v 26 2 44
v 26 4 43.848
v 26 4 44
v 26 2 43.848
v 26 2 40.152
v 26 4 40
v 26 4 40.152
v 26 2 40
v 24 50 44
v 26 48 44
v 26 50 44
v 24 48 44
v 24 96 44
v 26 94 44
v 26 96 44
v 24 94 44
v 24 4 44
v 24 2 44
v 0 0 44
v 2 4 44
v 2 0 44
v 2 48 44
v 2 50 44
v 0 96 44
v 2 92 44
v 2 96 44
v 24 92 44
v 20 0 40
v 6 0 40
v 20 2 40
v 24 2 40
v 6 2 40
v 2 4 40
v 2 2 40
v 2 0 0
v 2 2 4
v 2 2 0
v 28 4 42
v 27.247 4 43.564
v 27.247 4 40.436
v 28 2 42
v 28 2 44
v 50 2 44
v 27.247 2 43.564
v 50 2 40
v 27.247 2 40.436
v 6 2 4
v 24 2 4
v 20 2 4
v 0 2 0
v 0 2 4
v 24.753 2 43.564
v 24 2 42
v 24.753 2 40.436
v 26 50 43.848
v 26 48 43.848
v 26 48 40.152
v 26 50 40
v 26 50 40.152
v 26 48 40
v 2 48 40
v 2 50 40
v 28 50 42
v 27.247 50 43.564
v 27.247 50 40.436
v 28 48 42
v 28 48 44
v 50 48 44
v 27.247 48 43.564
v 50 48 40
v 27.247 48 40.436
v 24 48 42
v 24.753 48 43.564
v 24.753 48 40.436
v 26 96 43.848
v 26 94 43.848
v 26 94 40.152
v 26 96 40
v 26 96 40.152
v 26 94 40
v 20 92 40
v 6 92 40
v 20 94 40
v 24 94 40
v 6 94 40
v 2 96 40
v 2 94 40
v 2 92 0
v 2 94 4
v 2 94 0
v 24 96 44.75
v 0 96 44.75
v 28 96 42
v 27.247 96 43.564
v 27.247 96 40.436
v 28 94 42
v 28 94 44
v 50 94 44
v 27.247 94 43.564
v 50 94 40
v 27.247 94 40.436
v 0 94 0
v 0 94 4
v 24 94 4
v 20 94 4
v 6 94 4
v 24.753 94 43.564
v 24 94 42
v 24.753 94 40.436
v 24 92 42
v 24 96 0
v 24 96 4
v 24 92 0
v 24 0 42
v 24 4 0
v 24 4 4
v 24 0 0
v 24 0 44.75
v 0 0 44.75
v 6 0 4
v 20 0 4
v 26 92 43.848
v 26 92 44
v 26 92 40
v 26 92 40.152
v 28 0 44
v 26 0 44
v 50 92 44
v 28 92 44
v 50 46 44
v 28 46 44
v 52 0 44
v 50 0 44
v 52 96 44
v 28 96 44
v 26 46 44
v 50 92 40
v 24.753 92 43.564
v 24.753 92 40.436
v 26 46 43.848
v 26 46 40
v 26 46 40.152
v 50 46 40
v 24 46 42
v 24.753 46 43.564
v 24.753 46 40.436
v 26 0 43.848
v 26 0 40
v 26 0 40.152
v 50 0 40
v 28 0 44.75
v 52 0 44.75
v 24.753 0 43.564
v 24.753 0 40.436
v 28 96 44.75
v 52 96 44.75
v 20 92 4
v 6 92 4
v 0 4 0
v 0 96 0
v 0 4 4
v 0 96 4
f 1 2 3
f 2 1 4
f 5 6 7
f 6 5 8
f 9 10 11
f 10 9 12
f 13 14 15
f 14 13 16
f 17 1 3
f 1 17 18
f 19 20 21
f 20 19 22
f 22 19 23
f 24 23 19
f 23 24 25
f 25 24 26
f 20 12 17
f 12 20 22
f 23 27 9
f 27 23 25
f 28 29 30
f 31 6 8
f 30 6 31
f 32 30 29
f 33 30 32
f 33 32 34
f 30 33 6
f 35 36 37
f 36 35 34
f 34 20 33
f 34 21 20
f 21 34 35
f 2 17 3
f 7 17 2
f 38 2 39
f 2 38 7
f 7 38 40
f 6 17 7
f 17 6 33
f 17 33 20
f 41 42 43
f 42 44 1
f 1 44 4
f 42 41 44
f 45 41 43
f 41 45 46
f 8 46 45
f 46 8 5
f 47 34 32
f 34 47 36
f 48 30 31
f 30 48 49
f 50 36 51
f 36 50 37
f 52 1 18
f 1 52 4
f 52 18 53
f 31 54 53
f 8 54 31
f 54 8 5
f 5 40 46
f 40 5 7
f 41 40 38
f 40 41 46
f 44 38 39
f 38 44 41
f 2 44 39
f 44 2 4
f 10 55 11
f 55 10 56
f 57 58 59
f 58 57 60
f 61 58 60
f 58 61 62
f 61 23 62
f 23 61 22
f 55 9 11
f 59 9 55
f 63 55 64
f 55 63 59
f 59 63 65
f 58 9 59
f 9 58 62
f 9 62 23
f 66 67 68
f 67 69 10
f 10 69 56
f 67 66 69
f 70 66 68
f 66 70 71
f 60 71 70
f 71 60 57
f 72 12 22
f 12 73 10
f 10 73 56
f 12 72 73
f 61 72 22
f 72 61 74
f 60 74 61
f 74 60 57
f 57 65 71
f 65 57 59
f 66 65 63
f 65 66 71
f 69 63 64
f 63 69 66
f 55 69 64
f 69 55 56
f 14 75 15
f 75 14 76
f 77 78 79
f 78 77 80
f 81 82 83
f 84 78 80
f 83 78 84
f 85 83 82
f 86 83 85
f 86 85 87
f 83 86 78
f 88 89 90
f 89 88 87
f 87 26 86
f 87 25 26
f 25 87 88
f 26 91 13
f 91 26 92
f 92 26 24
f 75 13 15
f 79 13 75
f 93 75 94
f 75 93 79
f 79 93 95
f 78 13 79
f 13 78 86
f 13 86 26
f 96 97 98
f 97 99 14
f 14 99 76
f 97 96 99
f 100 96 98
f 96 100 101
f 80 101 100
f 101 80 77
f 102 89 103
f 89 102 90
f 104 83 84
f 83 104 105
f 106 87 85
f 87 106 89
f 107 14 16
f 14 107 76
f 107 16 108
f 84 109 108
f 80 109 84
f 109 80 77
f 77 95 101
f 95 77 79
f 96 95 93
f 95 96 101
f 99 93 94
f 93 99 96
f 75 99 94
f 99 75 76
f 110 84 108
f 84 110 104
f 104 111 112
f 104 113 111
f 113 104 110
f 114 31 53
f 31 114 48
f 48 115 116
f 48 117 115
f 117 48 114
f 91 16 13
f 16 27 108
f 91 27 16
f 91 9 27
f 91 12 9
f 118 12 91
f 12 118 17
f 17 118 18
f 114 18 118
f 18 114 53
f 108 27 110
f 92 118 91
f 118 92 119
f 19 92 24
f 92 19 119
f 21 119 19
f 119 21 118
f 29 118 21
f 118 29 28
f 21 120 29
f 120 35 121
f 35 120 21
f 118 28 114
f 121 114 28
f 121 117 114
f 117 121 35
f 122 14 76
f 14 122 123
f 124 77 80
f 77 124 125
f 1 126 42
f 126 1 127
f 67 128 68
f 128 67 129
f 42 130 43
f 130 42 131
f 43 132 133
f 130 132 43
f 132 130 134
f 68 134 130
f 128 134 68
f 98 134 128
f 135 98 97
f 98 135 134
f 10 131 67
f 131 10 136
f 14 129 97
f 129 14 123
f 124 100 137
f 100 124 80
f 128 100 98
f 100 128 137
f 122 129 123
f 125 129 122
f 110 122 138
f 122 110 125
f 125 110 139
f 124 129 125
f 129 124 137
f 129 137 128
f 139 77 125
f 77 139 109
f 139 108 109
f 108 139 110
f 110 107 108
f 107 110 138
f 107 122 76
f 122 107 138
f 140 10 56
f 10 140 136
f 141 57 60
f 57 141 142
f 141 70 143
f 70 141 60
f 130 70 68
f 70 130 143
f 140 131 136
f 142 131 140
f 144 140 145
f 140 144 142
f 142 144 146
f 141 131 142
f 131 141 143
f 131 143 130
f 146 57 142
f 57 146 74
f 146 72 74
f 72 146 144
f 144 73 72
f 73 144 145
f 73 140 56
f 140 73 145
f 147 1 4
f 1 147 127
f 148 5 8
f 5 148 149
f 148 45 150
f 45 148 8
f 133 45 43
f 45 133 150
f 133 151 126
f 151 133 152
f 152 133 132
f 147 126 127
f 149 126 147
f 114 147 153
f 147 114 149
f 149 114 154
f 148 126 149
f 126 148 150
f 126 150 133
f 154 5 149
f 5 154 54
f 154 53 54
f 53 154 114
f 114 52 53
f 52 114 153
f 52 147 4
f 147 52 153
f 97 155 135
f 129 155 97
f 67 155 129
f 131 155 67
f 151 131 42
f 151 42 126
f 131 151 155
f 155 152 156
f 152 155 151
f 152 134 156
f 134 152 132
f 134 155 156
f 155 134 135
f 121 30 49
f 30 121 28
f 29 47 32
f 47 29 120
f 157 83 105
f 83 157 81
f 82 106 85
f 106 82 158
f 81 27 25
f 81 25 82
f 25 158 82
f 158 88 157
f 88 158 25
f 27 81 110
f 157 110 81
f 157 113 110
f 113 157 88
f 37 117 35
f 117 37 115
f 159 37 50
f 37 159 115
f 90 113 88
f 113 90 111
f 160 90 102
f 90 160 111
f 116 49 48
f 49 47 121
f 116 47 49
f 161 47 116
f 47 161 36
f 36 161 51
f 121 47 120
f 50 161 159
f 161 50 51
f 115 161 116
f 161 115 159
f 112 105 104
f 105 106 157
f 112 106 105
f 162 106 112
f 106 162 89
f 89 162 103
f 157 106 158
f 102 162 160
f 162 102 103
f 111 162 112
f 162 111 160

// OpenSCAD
// file: casters.scad
function caster_axel(wheel_r, axel_r) = [1 + axel_r, wheel_r + axel_r, 0];

module caster_bracket(wheel_r, wheel_h, axel_r, plate_t, padding=0.125, $fn=$fn) {
    plate_side = wheel_r + axel_r + 1;
    
    module caster_plate(
        wheel_r,
        axel_r,
        plate_t,
    ) {
        difference() {
            linear_extrude(plate_t)
            polygon([
                [0, 0],
                [0, plate_side],
                [2 + axel_r * 2, plate_side],
                [plate_side, 2 + axel_r * 2],
                [plate_side, 0],
            ]);
            
            axel = caster_axel(wheel_r, axel_r);
            translate(axel)
            cylinder(r=axel_r, h=plate_t, $fn=$fn);
        }
    }

    translate([0, -plate_t, 0])
    union() {
        translate([0, plate_t, 0]);
        caster_plate(wheel_r, axel_r, plate_t);

        translate([0, plate_t, wheel_h + (plate_t + padding * 2)])
        caster_plate(wheel_r, axel_r, plate_t);
        
        cube([plate_side, plate_t, wheel_h + ((plate_t + padding) * 2)]);
    }
}

module caster(
    wheel_r,
    wheel_h,
    axel_r,
    axel_h,
    bearing_r=0,
    bearing_h=0,
    plate_t=0.125,
    padding=0.125,
    $fn=$fn,
) {
    rotate([-90, 0, -90])
    translate([-(caster_axel(wheel_r, axel_r).y), bearing_h - (wheel_r * 2) - 1 + plate_t + padding, -((wheel_h/2) + plate_t + padding)])
    union() {
        caster_bracket(wheel_r, wheel_h, axel_r, plate_t, padding, $fn=$fn);
        
        translate(caster_axel(wheel_r, axel_r)) {
            translate([0, 0, plate_t + padding])
            cylinder(r = wheel_r, h=wheel_h, $fn=$fn);
            
            translate([0, 0, -padding]) {
                cylinder(r = axel_r, h = (wheel_h + (2* plate_t) + (padding*4)), $fn=$fn);
            }
        }
        
        translate([caster_axel(wheel_r, axel_r).y, 0, (wheel_h/2) + plate_t + padding])
        rotate([90, 0, 0]) {
            cylinder(r = bearing_r, h=bearing_h);
            
            translate([0, 0, bearing_h])
            cylinder(r=axel_r, h=axel_h, $fn=$fn);
        }
    }
}

caster(
    // wheel (r, h)
    5, 1, 
    // axel (r, h)
    0.5, 1,
    // bearing (r, h)
    0.75, 0.25,
    $fn=16
);
// main file
use <casters.scad>

module beam($fn=$fn) {
    union() {
        translate([2, 0, 0])
        cube([24, 2, 4]);
        translate([26, 0, 2])
        rotate([-90, 0, 0])
        cylinder(r=2, h=2, $fn=$fn);
    }
}

module top() {
    translate([0, 0, 4])
    cube([24, 96, 0.75]);
    
    translate([0, 2, 0])
    beam();
    
    translate([0, 48, 0])
    beam();

    translate([0, 94, 0])
    beam();
}


module worktop() {
    translate([0, 0, 40]) {
        translate([6, 0, 0])
        cube([14, 2, 4]);

        translate([6, 92, 0])
        cube([14, 2, 4]);

        top();

        // the wing
        translate([52, 96, 0])
        rotate([0, 0, 180])
        top();
        
        // supports
        translate([0, 0, -4]) {
        }
    }
    
    for(x=[2, 20])
    for(y=[0, 92])
    translate([x, y, 0])
    cube([4, 2, 44]);
    
    translate([6, 0, 0])
    cube([14, 2, 4]);
    
    translate([0, 2, 0])
    cube([24, 2, 4]);

    translate([6, 92, 0])
    cube([14, 2, 4]);
    
    translate([0, 94, 0])
    cube([24, 2, 4]);
}

worktop();
